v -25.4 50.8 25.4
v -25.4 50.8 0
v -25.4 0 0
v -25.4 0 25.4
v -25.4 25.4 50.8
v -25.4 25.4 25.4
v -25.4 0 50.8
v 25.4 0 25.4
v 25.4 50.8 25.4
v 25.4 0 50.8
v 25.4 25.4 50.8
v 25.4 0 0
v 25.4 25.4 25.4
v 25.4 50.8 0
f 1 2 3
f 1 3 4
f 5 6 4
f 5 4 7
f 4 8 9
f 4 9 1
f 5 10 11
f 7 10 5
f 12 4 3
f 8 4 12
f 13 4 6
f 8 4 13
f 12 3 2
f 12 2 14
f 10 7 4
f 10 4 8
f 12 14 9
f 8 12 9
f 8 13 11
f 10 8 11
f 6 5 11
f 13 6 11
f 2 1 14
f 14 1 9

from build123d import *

# Parameters (mm, degrees)
F0_W     = 25.4
F0_H     = 25.4
F1_DEPTH = 50.8
F2_DEPTH = 25.4


with BuildPart() as f1:
    # F0 (on Front) → F1 (new body)
    with BuildSketch(Plane.XZ):
        with Locations((-12.7, 12.7)):
            Rectangle(F0_W, F0_H)
        with Locations((12.7, 12.7)):
            Rectangle(F0_W, F0_H)
    extrude(amount=-F1_DEPTH)


with BuildPart() as f2:
    # F0 (on Front) → F2 (new body)
    with BuildSketch(Plane.XZ):
        with Locations((-12.7, 38.1)):
            Rectangle(F0_W, F0_H)
        with Locations((12.7, 38.1)):
            Rectangle(F0_W, F0_H)
    extrude(amount=-F2_DEPTH)


solid = Compound([f1.part, f2.part])
